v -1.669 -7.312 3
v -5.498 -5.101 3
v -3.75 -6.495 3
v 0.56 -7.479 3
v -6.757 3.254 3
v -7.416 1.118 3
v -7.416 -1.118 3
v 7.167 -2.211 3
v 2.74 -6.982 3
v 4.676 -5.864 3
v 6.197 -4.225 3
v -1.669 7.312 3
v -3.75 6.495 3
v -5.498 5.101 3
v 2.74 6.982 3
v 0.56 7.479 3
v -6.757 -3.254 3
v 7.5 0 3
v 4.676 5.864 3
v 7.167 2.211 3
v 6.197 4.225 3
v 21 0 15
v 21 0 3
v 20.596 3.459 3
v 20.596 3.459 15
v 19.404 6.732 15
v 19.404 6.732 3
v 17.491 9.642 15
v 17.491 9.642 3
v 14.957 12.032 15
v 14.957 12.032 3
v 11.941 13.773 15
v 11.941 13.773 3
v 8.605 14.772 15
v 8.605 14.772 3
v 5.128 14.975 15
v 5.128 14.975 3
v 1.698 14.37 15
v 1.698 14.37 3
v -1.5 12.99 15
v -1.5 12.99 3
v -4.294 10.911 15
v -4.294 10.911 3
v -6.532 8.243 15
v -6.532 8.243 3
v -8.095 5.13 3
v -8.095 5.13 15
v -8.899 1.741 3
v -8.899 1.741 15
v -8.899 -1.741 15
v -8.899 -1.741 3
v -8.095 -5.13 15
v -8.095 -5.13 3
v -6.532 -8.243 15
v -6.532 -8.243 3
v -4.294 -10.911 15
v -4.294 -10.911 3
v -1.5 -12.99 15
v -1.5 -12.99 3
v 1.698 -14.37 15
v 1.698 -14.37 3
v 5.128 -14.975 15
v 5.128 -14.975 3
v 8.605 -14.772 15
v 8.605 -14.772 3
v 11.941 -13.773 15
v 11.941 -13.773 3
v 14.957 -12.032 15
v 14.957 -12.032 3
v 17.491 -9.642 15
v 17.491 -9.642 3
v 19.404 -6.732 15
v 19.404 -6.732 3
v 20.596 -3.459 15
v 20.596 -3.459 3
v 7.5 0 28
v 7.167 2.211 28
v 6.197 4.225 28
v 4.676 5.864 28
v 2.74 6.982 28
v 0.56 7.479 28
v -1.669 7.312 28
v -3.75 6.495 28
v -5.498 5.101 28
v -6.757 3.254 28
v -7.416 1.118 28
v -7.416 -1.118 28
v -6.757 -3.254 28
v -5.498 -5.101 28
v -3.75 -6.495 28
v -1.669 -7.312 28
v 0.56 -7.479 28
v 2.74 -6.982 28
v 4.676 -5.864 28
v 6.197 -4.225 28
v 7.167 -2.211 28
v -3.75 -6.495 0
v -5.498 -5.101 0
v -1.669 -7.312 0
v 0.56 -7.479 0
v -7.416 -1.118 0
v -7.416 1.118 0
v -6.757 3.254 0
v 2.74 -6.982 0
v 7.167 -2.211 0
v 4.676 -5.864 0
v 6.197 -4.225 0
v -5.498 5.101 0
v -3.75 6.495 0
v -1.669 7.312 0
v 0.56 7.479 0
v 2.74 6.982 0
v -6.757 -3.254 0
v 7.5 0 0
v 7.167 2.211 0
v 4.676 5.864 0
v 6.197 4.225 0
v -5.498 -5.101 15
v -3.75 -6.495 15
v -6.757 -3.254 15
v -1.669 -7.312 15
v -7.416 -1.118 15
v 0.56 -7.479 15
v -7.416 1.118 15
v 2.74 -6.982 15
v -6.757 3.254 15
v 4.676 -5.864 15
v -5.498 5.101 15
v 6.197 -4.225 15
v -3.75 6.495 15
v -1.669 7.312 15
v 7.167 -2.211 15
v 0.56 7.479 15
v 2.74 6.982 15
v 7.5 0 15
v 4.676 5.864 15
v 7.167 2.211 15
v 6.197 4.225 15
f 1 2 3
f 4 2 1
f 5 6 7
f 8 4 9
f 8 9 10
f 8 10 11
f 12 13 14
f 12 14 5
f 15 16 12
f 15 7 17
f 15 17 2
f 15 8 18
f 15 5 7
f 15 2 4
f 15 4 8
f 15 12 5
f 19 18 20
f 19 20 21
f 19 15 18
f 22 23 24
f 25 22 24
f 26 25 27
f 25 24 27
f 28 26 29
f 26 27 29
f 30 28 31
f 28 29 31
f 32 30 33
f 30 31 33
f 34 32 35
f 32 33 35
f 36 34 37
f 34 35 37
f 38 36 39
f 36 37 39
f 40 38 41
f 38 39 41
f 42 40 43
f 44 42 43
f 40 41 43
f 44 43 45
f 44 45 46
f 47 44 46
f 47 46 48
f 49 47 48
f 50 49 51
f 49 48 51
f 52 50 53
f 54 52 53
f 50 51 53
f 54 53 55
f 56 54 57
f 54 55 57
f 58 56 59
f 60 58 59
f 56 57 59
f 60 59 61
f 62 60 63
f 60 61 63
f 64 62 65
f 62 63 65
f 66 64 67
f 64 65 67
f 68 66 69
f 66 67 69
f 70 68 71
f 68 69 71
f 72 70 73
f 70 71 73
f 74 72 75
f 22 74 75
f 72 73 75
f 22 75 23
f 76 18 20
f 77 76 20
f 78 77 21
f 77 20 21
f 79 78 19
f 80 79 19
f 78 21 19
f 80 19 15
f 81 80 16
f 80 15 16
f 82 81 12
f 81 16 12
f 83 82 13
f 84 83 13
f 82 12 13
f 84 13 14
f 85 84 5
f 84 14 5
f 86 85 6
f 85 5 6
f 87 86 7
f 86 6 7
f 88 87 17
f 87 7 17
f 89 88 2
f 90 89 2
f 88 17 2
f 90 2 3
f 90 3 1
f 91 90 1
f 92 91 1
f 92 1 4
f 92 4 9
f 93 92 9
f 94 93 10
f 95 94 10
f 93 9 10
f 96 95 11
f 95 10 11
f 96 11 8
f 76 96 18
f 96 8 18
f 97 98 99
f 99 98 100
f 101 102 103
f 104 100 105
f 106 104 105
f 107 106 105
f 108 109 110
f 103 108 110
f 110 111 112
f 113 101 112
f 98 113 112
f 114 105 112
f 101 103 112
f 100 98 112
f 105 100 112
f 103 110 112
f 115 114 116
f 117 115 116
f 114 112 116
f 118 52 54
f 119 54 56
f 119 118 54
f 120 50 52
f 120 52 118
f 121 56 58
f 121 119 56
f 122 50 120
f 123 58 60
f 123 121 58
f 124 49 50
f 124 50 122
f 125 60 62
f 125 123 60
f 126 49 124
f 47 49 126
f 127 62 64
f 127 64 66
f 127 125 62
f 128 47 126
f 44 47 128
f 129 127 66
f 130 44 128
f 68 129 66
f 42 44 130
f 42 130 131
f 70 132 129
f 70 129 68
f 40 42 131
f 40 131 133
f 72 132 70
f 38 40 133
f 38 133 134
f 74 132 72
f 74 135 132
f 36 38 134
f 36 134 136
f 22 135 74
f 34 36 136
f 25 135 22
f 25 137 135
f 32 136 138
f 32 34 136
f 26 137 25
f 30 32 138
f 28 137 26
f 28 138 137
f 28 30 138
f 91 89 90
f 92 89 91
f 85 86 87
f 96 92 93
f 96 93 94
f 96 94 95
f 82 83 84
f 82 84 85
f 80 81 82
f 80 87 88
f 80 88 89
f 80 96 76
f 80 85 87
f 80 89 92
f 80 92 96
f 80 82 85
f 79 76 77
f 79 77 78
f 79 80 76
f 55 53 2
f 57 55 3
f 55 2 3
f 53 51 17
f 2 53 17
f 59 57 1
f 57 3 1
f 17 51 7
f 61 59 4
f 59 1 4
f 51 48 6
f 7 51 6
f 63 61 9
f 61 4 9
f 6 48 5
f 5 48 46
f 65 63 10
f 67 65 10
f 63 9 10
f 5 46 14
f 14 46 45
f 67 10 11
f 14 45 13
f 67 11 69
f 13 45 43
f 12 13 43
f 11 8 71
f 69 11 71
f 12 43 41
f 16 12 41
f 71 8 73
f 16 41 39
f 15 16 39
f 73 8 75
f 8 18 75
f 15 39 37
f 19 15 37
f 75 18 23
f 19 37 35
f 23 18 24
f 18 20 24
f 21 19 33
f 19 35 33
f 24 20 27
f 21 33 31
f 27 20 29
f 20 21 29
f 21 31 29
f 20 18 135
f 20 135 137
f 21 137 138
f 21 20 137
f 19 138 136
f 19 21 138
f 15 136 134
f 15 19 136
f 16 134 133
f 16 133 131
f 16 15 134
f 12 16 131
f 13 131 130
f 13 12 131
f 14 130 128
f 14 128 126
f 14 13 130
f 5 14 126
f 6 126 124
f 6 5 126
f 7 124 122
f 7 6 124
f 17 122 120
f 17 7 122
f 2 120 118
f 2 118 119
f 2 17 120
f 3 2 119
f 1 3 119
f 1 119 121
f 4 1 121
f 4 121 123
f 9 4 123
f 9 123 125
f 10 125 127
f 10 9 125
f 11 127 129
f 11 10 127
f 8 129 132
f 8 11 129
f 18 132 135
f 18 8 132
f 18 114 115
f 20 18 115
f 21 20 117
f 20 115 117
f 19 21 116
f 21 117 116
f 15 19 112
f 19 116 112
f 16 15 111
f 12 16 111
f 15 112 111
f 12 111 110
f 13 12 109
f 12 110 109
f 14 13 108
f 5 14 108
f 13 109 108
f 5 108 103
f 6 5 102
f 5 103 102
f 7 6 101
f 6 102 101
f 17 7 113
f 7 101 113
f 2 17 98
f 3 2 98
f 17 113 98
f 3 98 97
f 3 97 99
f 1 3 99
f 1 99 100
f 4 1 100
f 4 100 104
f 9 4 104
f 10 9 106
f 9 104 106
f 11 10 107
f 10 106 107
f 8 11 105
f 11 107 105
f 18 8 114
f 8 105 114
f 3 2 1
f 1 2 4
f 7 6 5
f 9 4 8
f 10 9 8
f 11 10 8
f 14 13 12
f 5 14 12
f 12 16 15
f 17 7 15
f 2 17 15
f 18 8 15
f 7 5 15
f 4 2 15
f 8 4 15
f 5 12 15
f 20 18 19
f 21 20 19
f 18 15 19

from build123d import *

# Parameters (mm, degrees)
F0_R     = 7.5
F1_DEPTH = 3
F2_R     = 15
F2_R_2   = 7.5
F3_DEPTH = 12
F4_R     = 7.5
F5_DEPTH = 25


with BuildPart() as f1:
    # F0 (on Top) → F1 (new body)
    with BuildSketch(Plane.XY):
        Circle(F0_R)
    extrude(amount=F1_DEPTH)


with BuildPart() as f3:
    # F2 (on face) → F3 (new body)
    with BuildSketch(Plane.XY.offset(3)):
        with Locations((6, 0)):
            Circle(F2_R)
        Circle(F2_R_2, mode=Mode.SUBTRACT)
    extrude(amount=F3_DEPTH)


with BuildPart() as f5:
    # F4 (on face) → F5 (new body)
    with BuildSketch(Plane.XY.offset(3)):
        Circle(F4_R)
    extrude(amount=F5_DEPTH)


solid = Compound([f1.part, f3.part, f5.part])
